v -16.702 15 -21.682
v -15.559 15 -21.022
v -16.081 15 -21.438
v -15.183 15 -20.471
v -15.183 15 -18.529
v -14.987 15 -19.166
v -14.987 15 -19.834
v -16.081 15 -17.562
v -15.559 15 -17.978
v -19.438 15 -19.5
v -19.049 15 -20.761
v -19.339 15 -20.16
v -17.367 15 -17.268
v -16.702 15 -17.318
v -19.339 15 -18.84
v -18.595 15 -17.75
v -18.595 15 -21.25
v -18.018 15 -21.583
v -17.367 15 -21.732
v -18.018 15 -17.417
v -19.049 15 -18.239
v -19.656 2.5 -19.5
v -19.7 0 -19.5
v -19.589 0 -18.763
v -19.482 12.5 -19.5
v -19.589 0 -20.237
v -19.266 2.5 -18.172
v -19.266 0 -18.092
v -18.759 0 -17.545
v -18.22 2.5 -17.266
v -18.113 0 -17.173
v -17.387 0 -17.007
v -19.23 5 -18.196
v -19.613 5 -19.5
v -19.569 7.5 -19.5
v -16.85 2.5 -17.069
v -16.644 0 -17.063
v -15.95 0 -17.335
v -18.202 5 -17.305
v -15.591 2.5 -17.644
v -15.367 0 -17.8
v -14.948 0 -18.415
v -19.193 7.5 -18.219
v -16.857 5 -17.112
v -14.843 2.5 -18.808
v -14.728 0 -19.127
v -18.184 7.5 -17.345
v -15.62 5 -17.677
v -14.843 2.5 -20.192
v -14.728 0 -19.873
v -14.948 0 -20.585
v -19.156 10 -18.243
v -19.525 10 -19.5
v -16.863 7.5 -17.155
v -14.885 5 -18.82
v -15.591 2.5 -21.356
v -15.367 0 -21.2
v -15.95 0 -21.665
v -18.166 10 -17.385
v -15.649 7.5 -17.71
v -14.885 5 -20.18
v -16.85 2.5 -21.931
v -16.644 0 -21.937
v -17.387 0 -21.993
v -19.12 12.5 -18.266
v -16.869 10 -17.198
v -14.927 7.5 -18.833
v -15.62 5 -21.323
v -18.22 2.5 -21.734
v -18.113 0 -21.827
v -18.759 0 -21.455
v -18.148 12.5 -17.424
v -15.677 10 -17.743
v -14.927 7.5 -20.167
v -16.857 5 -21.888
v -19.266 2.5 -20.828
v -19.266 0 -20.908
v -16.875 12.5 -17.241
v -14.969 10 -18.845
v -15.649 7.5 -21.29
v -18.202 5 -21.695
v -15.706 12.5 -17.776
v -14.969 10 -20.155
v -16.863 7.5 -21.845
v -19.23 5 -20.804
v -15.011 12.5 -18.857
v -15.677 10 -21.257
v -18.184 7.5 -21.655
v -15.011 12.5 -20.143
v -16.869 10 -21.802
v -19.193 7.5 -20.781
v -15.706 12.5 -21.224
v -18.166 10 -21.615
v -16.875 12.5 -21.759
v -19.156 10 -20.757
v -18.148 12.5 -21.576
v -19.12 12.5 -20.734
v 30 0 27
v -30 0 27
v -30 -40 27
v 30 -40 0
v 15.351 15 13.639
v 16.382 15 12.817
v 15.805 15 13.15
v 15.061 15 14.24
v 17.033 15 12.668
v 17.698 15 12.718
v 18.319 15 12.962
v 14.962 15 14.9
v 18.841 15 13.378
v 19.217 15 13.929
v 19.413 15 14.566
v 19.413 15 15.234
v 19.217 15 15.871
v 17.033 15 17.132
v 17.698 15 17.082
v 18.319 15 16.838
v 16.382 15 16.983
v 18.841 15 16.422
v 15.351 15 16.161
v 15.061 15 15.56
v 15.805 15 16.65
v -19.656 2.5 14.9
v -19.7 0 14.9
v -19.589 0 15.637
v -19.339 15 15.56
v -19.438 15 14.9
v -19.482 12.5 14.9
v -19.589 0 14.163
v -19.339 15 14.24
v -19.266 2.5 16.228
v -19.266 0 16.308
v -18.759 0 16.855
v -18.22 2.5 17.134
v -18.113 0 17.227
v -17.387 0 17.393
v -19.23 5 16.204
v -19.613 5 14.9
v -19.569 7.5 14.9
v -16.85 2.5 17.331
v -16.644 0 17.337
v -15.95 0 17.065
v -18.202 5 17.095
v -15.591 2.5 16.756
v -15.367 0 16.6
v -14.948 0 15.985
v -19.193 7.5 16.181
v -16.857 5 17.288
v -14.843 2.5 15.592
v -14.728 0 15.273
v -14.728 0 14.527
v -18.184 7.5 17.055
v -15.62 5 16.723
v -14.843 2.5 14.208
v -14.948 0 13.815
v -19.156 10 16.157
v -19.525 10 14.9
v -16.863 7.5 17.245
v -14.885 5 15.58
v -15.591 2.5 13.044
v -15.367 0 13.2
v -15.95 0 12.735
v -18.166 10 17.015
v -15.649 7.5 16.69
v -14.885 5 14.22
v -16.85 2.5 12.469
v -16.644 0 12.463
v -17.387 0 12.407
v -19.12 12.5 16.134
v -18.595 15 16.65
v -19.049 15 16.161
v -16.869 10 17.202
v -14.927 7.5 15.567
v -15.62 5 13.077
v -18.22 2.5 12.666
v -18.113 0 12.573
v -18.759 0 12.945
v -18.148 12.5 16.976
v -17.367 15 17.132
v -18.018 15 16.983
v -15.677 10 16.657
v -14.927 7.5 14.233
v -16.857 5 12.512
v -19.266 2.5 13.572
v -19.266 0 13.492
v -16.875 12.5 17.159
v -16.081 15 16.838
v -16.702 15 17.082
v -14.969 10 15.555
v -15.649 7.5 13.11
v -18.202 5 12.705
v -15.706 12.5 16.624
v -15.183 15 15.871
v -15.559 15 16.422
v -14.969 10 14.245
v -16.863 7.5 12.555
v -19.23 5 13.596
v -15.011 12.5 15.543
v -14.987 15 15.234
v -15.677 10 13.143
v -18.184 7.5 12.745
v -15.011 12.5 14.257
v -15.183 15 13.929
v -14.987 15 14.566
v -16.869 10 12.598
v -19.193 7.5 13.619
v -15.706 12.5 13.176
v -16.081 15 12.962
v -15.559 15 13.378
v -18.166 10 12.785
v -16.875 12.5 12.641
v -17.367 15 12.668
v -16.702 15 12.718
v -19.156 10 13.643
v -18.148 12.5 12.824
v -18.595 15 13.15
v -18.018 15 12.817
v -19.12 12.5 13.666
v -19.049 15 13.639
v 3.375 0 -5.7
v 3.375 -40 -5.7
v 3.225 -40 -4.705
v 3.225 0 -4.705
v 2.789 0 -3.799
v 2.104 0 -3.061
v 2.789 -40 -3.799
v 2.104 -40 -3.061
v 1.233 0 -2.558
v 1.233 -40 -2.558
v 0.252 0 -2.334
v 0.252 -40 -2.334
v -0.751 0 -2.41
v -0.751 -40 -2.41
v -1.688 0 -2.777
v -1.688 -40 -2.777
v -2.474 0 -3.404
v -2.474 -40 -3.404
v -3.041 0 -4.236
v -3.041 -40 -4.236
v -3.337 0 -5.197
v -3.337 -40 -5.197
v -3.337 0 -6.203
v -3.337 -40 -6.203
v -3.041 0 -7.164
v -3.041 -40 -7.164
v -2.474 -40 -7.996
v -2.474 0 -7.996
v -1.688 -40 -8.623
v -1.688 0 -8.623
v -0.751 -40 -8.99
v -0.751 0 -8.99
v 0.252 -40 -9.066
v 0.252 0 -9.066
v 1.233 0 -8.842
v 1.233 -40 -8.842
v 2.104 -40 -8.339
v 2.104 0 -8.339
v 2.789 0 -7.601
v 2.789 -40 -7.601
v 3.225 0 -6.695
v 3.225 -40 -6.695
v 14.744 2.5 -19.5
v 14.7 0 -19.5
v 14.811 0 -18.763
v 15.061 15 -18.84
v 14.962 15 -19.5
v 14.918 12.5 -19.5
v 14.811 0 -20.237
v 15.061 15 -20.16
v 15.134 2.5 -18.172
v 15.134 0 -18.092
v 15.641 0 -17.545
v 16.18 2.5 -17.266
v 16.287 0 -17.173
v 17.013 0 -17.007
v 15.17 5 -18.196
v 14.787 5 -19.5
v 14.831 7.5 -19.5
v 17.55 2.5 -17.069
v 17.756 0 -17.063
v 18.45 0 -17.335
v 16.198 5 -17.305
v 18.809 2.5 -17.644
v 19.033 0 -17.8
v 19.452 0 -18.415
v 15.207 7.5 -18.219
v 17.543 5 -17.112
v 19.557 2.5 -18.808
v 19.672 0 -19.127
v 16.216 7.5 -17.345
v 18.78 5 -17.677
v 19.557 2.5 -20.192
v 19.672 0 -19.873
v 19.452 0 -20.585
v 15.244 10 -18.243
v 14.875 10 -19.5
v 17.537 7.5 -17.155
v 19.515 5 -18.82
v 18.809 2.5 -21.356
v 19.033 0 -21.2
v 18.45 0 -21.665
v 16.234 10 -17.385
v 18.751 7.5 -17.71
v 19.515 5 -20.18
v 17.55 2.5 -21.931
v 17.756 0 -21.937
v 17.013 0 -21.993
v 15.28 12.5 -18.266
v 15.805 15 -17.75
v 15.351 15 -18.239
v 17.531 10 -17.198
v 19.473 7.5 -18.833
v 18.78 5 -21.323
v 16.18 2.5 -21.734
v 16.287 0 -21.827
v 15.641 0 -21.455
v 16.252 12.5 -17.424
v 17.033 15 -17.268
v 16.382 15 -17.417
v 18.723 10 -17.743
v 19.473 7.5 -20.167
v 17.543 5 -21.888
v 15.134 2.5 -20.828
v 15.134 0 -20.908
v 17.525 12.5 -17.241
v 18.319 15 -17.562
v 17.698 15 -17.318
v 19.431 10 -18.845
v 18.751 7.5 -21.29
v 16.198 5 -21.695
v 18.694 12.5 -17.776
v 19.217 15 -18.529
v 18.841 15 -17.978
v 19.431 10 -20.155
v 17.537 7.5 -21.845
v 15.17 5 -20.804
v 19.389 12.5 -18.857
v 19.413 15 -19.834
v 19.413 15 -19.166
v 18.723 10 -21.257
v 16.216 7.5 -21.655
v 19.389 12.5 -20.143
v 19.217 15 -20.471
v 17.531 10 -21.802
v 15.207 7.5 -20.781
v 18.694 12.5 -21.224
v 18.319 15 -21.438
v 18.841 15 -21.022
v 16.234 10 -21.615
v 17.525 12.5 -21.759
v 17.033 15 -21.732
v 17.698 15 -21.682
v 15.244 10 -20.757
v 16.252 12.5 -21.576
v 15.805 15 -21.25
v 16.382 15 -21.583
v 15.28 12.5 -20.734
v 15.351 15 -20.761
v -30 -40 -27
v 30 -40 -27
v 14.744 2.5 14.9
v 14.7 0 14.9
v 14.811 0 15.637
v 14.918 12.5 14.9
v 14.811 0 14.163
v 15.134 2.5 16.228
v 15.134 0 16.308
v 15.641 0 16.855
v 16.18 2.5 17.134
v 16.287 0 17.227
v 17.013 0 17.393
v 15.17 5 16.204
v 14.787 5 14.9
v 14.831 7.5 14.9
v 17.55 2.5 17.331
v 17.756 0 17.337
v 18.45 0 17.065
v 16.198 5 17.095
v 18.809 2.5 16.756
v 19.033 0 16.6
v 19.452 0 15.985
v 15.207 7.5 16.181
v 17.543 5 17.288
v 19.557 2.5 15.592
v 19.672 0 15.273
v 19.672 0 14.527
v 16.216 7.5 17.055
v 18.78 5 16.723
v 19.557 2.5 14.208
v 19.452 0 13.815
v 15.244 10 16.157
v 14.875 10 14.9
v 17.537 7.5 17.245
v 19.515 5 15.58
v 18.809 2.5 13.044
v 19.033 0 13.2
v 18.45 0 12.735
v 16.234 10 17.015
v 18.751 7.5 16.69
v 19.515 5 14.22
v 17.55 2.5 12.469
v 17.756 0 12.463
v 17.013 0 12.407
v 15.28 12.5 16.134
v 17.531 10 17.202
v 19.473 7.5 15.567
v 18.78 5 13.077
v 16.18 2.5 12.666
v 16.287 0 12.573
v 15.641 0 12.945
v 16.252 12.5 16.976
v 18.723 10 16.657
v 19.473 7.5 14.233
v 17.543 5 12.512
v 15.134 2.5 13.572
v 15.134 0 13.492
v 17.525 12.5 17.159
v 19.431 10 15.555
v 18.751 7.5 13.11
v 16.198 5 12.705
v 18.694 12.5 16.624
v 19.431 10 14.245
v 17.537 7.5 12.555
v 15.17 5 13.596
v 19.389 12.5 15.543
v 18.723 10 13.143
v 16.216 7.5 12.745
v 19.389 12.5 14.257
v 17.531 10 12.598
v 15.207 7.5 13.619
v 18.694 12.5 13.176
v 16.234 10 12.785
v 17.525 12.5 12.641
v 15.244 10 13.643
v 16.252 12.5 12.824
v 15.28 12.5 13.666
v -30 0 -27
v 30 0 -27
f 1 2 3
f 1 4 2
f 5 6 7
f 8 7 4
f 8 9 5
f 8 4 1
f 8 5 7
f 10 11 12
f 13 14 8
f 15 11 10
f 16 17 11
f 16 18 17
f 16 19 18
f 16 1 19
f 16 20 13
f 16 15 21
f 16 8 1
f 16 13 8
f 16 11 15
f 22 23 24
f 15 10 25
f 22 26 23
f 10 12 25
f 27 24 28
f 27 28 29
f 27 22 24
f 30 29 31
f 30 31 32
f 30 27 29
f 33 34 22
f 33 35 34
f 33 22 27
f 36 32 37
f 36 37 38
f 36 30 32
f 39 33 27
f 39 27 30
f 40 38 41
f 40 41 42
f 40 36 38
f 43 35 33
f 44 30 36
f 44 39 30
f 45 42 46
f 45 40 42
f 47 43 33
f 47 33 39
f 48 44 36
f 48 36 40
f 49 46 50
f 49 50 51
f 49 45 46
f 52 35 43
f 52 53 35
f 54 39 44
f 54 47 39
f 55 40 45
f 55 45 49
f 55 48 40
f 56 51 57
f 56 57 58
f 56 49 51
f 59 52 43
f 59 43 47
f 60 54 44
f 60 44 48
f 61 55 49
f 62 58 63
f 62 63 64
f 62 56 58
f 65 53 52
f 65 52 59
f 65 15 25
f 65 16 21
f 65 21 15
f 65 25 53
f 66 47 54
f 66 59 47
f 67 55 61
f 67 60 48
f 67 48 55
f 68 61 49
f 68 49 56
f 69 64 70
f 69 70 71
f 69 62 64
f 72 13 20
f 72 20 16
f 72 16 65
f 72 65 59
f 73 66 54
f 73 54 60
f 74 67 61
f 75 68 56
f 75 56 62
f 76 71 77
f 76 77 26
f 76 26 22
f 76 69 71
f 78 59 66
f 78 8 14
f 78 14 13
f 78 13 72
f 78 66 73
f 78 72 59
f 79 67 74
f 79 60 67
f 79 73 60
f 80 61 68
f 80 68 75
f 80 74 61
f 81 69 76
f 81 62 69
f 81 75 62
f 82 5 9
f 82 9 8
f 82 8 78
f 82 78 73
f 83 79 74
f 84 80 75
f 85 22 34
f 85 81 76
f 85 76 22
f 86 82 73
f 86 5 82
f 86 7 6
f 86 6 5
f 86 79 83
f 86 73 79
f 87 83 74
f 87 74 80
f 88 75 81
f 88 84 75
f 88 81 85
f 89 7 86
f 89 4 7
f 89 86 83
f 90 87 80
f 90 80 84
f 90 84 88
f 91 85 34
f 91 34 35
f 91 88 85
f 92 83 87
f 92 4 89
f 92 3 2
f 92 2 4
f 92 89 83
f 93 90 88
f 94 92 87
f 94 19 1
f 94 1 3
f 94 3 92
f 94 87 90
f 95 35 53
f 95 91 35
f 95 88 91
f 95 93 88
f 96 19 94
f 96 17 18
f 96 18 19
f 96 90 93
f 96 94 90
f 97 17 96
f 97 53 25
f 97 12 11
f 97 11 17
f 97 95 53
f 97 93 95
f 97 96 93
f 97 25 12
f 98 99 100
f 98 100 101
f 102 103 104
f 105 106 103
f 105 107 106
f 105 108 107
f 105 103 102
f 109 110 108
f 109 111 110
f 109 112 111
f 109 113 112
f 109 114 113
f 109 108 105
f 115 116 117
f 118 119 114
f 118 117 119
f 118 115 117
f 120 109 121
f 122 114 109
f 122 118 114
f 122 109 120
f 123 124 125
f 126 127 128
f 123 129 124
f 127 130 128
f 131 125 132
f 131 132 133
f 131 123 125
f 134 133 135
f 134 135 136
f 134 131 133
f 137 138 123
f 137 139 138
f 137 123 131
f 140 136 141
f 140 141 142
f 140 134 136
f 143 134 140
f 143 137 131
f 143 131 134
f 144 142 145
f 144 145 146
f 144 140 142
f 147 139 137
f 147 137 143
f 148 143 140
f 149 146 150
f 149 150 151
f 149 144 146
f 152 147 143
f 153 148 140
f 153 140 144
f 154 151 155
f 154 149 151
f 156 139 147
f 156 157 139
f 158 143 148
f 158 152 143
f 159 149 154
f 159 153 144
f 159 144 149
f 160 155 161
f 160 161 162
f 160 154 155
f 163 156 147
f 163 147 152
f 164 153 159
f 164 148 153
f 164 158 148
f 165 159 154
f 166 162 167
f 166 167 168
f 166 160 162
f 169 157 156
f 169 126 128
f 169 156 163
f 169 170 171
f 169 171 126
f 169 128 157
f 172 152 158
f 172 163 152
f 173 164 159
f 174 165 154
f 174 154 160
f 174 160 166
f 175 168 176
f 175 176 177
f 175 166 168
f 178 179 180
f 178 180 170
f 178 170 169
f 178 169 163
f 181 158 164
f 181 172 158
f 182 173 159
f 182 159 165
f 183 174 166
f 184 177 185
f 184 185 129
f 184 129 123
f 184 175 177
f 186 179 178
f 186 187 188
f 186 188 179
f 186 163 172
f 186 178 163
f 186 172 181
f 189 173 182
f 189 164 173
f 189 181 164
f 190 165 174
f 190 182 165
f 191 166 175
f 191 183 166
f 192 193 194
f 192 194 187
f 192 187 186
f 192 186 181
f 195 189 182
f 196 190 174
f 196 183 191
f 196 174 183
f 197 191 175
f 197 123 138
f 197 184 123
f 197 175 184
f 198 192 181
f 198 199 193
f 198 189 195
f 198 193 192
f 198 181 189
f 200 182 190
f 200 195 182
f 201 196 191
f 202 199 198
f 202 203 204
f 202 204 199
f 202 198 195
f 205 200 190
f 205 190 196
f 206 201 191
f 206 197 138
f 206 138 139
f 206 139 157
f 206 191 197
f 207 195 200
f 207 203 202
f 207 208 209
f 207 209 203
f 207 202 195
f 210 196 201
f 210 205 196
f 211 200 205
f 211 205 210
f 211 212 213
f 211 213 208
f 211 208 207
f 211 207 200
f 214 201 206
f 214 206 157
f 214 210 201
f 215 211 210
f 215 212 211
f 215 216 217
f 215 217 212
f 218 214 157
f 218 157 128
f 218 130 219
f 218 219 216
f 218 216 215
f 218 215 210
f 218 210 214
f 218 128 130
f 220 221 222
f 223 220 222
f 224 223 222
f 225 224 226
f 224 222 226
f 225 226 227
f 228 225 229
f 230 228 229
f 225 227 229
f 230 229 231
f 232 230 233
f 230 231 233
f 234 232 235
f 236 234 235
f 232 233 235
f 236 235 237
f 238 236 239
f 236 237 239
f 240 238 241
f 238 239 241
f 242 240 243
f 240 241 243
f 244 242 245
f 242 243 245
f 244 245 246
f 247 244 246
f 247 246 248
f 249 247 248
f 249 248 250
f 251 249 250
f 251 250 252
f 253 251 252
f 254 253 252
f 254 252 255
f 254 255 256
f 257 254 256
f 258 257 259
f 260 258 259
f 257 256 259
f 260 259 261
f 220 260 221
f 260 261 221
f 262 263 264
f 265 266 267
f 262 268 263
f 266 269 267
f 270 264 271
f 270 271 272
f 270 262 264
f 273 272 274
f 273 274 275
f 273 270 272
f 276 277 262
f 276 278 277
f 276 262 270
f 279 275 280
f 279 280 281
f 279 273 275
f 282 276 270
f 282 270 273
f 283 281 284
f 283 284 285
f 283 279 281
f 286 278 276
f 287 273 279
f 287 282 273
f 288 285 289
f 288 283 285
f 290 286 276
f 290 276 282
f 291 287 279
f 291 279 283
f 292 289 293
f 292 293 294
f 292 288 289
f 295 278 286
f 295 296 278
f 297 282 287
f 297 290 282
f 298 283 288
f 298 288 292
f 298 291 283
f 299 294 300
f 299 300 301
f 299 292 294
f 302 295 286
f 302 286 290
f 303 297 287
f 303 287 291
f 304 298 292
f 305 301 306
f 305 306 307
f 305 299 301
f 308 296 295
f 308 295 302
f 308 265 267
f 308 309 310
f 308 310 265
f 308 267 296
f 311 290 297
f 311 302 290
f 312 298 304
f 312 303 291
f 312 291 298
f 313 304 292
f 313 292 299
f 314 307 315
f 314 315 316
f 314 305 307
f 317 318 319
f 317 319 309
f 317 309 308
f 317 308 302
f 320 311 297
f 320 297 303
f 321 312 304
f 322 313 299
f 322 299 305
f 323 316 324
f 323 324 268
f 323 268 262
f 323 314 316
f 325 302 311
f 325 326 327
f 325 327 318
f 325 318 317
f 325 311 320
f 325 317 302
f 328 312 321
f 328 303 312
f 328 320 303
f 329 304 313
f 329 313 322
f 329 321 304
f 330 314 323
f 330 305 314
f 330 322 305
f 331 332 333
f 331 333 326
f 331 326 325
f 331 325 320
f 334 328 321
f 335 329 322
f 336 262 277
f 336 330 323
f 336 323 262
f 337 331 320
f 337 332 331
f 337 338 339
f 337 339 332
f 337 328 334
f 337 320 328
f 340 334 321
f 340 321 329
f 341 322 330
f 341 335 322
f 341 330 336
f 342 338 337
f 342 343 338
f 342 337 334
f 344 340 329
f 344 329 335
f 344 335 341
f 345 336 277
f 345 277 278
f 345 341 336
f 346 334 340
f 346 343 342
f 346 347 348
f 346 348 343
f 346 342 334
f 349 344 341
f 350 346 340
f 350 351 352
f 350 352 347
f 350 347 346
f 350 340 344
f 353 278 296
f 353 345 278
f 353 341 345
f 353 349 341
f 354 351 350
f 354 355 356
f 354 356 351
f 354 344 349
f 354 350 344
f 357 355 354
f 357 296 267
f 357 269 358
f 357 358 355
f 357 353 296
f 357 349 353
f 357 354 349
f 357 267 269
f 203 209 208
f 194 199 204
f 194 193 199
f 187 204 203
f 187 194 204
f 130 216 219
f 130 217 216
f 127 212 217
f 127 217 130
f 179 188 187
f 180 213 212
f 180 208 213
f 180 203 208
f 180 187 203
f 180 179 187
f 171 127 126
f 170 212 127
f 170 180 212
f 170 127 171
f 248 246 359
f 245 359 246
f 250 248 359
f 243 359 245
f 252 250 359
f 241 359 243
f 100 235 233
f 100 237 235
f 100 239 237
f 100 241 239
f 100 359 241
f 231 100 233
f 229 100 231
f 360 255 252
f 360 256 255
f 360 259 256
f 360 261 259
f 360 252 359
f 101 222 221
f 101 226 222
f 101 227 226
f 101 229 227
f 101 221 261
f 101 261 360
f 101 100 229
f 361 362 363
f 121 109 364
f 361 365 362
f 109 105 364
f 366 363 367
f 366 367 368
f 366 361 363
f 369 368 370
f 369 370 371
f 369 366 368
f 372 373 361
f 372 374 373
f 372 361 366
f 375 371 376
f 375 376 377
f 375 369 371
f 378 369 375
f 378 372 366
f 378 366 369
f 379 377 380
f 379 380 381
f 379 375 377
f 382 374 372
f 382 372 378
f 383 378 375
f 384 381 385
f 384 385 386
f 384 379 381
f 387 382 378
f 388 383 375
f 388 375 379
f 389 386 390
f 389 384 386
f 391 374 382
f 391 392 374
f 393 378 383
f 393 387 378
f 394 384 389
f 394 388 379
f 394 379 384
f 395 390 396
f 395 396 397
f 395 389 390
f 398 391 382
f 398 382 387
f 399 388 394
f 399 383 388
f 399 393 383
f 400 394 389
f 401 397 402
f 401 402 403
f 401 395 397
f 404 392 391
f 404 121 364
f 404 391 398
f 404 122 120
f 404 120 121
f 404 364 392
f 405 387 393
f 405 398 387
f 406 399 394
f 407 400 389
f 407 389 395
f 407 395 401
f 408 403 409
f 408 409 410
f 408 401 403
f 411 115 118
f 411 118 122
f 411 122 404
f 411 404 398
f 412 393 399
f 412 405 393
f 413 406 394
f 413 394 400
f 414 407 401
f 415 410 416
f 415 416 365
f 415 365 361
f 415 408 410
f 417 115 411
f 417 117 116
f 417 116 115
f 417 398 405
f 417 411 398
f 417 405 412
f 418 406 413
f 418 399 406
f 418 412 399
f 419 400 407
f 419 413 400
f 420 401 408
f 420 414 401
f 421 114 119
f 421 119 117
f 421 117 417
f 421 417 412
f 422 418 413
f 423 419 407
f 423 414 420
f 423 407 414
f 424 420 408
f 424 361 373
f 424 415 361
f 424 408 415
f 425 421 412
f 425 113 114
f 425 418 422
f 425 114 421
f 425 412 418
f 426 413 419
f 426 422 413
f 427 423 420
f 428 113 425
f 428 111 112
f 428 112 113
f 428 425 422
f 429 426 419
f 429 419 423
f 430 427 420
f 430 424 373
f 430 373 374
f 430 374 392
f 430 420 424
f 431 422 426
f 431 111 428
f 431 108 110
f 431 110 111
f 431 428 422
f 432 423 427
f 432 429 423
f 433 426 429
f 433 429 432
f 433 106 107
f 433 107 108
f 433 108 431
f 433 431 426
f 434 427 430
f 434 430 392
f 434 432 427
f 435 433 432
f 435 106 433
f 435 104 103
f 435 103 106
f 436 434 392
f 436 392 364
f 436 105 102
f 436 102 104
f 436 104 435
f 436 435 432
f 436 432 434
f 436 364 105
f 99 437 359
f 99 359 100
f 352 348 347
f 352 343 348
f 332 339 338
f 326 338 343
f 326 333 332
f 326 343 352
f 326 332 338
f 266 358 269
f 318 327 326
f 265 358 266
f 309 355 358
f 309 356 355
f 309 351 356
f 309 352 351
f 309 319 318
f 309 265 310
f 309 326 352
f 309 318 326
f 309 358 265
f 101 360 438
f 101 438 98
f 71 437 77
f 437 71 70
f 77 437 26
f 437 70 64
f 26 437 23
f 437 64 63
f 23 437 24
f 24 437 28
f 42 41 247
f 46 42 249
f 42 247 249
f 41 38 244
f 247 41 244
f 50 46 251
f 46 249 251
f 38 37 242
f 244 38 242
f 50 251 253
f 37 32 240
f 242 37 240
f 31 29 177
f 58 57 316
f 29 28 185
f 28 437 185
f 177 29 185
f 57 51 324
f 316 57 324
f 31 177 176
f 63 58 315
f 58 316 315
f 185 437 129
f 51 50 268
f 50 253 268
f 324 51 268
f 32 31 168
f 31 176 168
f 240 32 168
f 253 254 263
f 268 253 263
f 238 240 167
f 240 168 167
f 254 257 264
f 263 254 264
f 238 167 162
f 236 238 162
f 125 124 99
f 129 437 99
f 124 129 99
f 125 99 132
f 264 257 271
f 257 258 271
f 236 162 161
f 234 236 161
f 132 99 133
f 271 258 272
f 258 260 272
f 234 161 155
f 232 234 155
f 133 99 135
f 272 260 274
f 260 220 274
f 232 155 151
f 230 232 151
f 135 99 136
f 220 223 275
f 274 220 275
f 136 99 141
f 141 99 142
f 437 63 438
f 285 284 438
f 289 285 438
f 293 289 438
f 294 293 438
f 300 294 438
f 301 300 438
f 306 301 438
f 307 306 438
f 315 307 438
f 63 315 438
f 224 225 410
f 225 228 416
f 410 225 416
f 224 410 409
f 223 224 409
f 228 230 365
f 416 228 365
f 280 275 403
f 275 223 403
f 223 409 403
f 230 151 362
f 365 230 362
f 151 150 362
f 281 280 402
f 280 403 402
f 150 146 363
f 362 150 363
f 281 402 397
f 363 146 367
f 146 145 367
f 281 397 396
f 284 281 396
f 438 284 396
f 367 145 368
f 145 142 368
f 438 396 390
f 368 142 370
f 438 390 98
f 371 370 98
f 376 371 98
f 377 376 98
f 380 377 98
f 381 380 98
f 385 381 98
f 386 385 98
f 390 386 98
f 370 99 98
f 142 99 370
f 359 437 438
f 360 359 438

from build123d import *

# Parameters (mm, degrees)
F0_W     = 60
F0_H     = 54
F1_DEPTH = 40
F2_R     = 2.5
F3_DEPTH = 15
F3_TAPER = 1
F4_R     = 3.375
F5_DEPTH = 40
F8_W     = 83.198
F8_H     = 59.4474617392
F9_DEPTH = 25


with BuildPart() as f1:
    # F0 (on Front) → F1 (new body)
    with BuildSketch(Plane.XZ):
        Rectangle(F0_W, F0_H)
    extrude(amount=F1_DEPTH)

    # F2 (on face) → F3 (join)
    with BuildSketch(Plane(origin=(0, 0, 0), x_dir=(-1, 0, 0), z_dir=(0, 1, 0))):
        with Locations((-17.2, 14.9)):
            Circle(F2_R)
        with Locations((17.2, 14.9)):
            Circle(F2_R)
        with Locations((17.2, -19.5)):
            Circle(F2_R)
        with Locations((-17.2, -19.5)):
            Circle(F2_R)
    extrude(amount=F3_DEPTH, taper=F3_TAPER)

    # F4 (on face) → F5 (cut, through all)
    with BuildSketch(Plane.XZ.offset(40)):
        with Locations((0, -5.7)):
            Circle(F4_R)
    extrude(amount=-F5_DEPTH, mode=Mode.SUBTRACT)

    # F8 (on 3pt) → F9 (cut)
    with BuildSketch(Plane(origin=(10.9913305692, -16.4869958538, 24.4251790426), x_dir=(0.9369493608, 0.1955162685, -0.2896537311), z_dir=(0.3494651559, -0.5241977339, 0.7765892354))):
        with Locations((-3.7034322848, -10.5544058606)):
            Rectangle(F8_W, F8_H)
    extrude(amount=F9_DEPTH, mode=Mode.SUBTRACT)


solid = f1.part
